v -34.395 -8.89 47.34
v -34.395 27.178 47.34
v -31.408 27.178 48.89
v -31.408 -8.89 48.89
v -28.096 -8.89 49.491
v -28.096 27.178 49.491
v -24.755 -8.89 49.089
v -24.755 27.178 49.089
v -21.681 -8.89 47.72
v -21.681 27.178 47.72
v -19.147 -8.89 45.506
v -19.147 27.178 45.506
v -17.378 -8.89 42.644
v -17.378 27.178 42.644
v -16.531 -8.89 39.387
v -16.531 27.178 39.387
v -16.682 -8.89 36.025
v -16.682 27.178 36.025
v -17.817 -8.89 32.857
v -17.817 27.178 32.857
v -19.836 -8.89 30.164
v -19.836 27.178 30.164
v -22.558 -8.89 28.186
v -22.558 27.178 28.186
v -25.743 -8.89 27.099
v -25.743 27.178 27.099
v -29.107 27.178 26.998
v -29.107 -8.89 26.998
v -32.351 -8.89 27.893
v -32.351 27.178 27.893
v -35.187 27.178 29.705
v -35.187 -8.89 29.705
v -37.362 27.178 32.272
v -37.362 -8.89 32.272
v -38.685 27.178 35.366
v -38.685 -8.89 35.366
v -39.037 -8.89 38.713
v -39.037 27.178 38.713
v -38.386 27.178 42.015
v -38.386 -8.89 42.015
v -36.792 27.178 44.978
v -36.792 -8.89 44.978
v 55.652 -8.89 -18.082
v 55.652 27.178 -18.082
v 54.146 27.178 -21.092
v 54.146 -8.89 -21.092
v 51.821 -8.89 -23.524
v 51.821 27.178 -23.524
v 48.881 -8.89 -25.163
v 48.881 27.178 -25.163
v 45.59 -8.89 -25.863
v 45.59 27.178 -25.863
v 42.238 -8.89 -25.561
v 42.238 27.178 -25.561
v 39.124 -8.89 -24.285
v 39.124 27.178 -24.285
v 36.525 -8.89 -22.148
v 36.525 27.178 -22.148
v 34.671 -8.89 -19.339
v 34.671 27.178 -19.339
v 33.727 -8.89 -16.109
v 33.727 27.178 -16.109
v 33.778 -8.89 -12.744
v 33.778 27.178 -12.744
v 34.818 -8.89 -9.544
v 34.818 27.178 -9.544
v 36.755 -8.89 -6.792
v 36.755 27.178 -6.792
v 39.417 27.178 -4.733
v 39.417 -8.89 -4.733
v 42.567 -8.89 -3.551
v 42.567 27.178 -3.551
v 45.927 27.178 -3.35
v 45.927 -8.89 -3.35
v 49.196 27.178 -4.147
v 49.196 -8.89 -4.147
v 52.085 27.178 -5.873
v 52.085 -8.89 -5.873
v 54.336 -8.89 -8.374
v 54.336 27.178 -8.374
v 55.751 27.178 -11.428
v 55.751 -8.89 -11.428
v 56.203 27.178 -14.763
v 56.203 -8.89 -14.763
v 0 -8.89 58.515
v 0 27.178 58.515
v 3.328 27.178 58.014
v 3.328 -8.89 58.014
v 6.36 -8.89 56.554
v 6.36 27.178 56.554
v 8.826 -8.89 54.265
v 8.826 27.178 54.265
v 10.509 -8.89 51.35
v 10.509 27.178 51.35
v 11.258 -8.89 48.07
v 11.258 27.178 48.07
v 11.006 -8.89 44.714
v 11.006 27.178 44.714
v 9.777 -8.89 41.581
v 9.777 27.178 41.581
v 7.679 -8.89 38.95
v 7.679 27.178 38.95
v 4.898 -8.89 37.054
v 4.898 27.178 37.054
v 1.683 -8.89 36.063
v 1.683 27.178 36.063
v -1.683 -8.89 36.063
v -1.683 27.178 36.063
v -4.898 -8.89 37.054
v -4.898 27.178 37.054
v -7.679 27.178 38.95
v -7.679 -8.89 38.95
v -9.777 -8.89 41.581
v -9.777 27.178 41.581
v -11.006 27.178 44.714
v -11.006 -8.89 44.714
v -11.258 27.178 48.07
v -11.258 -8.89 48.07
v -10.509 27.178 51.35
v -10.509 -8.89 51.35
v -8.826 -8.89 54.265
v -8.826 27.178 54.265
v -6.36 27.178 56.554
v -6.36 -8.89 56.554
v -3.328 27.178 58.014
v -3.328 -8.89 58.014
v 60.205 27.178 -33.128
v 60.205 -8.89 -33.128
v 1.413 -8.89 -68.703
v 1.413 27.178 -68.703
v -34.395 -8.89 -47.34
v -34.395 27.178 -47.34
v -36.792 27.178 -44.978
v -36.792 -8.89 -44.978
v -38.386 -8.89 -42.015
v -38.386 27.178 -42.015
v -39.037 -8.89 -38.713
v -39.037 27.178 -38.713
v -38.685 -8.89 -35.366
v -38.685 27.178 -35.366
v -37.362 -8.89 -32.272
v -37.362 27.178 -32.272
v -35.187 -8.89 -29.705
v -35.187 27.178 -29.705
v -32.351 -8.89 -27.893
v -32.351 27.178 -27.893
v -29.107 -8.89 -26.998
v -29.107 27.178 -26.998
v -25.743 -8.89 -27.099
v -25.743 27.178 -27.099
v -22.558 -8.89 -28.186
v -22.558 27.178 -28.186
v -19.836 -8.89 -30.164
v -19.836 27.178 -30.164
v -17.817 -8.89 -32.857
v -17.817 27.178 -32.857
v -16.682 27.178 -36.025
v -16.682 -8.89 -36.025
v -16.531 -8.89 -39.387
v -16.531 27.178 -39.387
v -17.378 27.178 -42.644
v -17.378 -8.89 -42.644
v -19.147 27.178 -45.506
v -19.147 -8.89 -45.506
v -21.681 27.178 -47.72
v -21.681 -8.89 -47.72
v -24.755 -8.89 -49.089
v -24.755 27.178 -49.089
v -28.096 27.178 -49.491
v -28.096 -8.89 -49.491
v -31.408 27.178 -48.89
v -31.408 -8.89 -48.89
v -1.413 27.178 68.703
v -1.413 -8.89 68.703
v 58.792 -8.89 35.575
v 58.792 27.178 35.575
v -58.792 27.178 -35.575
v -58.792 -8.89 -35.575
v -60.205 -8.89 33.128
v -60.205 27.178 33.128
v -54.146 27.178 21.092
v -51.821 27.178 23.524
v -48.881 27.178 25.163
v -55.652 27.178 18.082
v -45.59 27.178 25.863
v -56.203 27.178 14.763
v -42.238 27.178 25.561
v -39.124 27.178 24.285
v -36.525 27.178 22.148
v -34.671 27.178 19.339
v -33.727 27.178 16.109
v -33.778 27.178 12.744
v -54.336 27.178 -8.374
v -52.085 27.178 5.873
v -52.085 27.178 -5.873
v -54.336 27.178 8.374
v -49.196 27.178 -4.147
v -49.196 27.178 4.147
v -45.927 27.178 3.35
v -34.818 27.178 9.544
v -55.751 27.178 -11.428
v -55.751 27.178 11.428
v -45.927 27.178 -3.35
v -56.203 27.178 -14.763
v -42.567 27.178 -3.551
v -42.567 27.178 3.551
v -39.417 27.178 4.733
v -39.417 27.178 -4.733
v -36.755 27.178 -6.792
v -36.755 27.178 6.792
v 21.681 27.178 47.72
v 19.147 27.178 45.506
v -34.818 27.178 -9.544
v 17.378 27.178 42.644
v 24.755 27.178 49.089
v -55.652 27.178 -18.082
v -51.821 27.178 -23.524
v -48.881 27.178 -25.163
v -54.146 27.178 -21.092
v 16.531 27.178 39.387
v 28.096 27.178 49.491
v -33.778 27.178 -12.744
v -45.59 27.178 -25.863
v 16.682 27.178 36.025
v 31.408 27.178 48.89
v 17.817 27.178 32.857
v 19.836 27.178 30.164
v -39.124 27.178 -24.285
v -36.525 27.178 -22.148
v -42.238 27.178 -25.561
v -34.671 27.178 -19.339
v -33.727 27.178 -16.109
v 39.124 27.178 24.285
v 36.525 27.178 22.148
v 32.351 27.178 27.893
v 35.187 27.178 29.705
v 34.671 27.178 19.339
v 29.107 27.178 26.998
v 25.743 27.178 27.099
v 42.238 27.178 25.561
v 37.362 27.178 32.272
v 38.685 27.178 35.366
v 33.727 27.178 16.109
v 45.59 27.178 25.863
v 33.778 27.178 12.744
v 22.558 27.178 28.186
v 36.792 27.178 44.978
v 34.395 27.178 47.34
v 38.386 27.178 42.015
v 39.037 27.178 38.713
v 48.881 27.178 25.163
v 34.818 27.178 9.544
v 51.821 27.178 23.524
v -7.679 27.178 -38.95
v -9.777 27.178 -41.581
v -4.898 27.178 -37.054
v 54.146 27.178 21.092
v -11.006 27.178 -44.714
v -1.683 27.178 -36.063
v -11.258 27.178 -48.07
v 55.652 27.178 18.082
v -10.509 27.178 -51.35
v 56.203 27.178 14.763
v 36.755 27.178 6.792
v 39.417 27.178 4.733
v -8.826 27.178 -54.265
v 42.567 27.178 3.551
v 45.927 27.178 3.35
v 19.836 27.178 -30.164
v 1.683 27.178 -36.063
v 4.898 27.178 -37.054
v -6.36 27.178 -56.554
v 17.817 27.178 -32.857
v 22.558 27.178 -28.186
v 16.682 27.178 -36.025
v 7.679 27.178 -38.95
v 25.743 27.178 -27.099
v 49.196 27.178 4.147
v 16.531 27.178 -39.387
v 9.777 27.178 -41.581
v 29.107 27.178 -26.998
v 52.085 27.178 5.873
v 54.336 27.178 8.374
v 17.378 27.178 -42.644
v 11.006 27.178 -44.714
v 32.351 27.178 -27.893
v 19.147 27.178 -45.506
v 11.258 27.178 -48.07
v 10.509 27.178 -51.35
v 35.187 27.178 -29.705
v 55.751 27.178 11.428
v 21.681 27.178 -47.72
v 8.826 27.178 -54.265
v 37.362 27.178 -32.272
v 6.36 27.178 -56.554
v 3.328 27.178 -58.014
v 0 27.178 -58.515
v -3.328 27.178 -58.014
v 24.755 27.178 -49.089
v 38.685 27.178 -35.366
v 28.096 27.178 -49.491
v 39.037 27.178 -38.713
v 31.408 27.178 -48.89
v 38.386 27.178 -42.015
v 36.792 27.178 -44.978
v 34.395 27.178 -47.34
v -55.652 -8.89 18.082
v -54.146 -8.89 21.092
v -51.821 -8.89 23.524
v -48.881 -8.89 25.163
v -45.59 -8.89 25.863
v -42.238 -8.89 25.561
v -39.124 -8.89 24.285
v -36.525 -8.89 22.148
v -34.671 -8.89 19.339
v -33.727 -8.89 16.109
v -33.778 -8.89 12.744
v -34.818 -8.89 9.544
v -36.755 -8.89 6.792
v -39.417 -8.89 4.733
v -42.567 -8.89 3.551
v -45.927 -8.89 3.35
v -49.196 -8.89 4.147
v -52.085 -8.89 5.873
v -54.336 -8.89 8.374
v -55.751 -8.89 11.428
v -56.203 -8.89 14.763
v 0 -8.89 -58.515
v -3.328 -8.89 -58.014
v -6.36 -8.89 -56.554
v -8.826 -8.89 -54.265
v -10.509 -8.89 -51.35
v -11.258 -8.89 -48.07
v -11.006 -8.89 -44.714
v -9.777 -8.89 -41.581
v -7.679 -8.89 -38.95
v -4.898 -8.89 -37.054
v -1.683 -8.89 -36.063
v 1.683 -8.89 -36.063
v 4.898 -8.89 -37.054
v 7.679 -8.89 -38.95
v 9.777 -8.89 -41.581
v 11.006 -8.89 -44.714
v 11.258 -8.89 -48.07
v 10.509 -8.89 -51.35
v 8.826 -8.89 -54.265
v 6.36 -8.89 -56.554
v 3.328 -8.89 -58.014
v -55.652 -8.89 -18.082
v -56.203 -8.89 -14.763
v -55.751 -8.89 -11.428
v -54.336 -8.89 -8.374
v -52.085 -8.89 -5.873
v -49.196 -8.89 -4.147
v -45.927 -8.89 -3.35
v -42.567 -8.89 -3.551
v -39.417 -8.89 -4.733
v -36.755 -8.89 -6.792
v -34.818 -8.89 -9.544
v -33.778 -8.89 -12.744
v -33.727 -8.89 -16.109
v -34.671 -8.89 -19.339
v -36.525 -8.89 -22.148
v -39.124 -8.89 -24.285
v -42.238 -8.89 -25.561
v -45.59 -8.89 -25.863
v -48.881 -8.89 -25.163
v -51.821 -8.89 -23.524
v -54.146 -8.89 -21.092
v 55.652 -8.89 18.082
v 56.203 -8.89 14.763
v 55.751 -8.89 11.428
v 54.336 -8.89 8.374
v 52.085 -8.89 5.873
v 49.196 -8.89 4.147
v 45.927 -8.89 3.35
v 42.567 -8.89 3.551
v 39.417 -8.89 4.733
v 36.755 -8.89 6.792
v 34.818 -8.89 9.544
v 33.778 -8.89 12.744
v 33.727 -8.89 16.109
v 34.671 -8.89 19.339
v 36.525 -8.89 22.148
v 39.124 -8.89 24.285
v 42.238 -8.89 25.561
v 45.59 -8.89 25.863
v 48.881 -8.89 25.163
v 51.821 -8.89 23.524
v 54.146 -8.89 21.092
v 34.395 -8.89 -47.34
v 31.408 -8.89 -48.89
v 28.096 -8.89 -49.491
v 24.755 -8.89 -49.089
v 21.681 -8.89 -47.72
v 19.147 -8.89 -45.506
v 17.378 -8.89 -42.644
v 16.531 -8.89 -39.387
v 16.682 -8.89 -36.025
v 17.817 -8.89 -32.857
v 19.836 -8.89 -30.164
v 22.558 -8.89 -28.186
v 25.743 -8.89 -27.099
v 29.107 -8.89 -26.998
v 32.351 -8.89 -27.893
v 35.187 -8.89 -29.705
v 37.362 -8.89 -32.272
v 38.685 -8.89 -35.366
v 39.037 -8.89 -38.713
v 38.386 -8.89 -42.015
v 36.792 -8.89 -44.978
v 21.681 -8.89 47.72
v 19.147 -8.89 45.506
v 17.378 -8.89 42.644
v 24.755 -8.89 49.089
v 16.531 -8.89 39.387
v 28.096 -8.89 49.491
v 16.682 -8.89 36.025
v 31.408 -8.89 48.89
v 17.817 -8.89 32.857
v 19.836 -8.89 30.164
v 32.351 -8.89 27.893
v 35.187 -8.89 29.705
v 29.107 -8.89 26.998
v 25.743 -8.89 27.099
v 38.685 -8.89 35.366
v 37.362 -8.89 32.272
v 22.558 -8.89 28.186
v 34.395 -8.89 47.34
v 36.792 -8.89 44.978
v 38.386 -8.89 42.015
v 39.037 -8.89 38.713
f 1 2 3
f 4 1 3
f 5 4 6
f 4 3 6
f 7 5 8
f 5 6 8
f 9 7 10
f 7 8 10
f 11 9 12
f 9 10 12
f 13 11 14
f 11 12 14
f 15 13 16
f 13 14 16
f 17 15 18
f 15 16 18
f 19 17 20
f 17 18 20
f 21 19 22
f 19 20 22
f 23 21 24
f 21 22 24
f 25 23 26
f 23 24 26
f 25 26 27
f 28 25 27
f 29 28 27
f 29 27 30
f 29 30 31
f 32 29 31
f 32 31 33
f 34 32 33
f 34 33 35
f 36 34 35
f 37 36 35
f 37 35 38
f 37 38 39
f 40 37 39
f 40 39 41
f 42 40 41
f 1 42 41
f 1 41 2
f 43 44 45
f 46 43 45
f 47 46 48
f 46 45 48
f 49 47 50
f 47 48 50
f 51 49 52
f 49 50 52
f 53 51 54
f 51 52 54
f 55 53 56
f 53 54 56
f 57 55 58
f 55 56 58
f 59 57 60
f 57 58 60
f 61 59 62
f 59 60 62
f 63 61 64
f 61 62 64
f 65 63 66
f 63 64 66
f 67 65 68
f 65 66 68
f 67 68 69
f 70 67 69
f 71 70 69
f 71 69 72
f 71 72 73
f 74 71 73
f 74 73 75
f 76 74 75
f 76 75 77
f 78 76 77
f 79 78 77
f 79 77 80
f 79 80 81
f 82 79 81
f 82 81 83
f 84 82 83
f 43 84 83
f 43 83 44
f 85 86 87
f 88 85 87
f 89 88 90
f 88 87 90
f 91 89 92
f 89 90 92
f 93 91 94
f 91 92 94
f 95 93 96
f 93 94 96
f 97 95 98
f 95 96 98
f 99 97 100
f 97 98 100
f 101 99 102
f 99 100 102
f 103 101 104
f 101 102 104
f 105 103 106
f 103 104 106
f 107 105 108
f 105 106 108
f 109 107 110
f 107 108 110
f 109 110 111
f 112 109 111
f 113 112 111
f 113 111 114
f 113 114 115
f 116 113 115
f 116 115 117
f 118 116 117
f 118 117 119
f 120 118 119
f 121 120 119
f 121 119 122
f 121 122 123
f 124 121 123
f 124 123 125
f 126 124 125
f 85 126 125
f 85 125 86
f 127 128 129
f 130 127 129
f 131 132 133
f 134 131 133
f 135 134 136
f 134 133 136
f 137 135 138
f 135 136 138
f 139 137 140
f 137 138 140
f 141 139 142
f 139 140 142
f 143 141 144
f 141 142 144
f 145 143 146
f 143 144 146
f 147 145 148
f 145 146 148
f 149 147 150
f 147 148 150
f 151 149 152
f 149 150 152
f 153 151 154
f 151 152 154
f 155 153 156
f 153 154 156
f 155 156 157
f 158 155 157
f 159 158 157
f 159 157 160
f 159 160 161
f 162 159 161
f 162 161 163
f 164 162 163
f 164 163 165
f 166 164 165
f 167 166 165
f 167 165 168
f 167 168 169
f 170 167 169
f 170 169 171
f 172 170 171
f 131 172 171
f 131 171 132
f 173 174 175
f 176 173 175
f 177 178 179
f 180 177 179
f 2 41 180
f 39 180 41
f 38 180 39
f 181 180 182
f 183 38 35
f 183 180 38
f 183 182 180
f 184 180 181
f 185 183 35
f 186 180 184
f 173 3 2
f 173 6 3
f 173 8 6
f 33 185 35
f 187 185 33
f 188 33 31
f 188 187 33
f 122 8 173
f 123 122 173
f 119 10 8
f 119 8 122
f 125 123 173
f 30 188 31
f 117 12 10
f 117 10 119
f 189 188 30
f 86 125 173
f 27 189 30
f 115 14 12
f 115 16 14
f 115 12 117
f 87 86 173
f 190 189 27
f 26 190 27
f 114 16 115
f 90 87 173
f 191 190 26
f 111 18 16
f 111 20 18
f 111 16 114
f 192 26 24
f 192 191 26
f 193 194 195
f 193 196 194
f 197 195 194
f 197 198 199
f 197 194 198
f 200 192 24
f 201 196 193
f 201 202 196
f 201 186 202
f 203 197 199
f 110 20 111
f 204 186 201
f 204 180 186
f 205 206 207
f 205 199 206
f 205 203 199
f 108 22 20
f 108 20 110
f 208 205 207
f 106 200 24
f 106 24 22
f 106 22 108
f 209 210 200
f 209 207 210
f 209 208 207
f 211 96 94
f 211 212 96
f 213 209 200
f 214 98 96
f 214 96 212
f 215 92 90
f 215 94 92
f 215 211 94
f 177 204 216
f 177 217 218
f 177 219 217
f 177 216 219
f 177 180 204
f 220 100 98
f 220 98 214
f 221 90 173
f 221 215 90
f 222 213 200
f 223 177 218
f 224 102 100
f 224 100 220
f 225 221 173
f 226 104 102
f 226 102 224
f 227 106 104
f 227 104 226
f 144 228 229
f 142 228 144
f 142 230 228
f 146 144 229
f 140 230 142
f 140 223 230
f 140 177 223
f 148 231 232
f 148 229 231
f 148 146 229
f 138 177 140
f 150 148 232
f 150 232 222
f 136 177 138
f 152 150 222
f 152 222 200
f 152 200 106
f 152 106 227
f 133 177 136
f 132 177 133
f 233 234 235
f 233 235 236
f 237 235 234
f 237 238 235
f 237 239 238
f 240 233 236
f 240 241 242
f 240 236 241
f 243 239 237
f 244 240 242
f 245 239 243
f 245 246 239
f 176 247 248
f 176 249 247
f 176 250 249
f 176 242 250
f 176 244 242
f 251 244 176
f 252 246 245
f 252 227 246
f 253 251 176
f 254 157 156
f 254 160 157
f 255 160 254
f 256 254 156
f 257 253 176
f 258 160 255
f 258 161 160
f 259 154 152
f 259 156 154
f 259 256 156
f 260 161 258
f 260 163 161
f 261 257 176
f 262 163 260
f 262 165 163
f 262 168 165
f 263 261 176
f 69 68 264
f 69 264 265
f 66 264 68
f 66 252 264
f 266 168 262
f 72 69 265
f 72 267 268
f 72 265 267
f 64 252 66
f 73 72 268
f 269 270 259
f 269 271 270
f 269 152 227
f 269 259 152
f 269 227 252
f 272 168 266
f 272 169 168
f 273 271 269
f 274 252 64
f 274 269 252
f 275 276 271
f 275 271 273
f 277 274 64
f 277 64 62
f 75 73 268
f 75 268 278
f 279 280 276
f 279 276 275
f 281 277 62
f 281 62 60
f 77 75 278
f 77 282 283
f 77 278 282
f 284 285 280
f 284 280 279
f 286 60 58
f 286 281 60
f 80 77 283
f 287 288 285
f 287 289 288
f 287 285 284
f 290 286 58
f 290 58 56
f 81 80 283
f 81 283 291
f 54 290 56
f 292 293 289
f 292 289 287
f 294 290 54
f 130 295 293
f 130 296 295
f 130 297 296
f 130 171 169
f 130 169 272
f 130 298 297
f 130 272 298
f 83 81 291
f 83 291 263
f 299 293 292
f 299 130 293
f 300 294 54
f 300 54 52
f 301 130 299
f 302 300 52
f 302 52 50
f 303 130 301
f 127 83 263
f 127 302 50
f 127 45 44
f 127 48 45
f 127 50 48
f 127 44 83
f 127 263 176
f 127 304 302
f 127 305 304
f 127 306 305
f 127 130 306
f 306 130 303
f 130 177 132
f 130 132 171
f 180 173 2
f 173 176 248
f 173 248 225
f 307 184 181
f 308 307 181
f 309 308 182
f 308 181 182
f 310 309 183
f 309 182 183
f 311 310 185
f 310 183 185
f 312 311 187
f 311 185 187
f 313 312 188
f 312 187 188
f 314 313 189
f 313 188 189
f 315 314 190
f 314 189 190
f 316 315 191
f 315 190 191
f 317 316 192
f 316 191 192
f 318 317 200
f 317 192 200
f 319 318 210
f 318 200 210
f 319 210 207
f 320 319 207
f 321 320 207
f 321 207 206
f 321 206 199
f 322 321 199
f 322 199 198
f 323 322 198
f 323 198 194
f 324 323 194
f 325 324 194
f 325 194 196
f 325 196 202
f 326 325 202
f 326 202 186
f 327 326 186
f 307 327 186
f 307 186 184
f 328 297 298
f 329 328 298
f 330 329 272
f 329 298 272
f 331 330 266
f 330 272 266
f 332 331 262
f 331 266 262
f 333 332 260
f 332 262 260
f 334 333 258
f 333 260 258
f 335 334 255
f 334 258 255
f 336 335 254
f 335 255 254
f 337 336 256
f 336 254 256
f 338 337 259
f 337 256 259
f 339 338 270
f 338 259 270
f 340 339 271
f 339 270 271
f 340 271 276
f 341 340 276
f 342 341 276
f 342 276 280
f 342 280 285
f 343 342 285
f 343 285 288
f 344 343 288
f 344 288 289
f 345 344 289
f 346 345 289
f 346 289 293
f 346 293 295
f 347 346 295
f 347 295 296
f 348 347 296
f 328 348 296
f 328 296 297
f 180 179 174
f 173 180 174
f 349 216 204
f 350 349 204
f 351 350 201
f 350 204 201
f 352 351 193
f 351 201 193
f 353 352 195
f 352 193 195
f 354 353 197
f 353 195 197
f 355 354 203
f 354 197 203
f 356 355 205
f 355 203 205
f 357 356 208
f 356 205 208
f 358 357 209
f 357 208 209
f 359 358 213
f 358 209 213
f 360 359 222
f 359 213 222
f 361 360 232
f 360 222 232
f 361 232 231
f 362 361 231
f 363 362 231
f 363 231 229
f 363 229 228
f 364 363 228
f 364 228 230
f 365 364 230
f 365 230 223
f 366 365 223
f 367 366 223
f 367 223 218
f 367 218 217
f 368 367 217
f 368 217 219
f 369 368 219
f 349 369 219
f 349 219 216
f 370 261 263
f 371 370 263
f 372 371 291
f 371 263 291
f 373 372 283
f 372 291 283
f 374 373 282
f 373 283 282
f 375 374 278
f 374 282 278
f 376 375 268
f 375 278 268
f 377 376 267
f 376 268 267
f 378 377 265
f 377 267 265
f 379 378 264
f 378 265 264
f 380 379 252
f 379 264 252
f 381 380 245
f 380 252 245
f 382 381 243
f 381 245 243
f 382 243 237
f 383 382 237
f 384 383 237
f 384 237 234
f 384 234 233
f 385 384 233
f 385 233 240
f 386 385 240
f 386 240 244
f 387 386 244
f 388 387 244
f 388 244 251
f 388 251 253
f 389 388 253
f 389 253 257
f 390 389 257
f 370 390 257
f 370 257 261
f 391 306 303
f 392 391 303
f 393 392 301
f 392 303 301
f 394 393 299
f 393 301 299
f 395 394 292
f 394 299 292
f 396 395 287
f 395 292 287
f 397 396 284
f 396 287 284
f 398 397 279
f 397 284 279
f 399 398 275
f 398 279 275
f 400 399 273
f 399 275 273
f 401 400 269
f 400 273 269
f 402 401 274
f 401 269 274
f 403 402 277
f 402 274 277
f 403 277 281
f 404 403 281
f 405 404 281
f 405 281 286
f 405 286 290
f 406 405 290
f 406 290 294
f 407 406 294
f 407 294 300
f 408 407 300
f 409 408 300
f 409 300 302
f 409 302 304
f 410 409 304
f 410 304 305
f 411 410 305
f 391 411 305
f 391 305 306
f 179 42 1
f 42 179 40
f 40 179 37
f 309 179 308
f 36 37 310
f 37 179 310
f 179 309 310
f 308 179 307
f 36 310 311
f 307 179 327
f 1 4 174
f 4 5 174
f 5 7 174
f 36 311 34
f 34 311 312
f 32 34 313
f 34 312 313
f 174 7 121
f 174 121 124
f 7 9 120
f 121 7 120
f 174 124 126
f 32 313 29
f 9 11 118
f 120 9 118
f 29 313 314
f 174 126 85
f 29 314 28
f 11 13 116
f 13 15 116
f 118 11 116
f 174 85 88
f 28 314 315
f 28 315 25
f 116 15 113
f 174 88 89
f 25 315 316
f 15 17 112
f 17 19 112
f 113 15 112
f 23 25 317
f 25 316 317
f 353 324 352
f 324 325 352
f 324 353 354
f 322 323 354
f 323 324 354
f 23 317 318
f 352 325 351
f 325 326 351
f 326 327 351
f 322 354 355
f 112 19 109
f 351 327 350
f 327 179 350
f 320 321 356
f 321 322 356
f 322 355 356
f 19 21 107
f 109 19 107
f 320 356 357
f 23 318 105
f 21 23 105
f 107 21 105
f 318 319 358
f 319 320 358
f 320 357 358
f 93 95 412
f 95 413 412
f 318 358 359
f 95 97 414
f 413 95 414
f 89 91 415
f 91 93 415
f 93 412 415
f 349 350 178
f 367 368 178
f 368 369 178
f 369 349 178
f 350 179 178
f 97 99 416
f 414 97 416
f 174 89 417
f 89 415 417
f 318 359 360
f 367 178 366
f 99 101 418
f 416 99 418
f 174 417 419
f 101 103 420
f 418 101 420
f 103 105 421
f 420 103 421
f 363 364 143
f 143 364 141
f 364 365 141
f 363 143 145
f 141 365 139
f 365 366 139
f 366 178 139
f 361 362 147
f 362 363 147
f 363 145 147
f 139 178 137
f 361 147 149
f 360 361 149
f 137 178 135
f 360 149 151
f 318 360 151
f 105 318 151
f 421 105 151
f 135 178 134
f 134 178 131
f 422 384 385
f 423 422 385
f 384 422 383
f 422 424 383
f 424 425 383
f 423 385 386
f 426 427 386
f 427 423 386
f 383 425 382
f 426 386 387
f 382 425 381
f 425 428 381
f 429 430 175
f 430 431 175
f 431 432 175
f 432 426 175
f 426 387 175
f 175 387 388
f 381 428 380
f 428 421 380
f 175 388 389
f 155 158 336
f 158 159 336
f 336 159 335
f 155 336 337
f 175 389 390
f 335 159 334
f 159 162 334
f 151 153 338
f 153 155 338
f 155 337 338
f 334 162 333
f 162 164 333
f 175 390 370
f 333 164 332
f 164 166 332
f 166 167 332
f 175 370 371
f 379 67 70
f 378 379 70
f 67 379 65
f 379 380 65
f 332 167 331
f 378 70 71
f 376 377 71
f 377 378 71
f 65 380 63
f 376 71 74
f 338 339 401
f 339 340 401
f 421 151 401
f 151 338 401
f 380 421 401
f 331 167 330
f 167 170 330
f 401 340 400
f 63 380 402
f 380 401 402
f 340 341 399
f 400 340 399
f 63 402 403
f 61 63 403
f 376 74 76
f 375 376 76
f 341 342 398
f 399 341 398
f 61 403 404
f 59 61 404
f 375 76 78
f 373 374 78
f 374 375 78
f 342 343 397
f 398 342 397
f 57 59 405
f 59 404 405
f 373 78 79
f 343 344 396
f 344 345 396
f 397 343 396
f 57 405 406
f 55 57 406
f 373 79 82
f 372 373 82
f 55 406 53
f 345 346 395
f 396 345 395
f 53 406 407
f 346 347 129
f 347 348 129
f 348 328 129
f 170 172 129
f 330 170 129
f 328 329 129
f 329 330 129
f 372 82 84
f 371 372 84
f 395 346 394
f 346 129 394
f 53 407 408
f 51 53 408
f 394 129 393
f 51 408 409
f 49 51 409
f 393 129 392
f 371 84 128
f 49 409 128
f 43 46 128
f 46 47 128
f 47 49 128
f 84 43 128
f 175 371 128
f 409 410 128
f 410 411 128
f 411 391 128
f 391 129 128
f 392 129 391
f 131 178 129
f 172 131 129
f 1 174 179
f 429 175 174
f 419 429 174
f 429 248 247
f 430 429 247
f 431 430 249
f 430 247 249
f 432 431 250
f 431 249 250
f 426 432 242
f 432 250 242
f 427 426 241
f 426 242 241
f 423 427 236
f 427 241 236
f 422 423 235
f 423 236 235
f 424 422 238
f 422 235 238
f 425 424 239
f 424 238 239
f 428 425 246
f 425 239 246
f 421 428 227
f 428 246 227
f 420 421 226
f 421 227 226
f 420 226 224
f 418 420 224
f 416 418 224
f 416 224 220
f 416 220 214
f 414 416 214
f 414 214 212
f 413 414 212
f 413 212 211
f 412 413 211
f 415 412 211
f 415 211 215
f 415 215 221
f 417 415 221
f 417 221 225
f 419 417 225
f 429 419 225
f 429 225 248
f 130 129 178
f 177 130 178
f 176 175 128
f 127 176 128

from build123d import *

# Parameters (mm, degrees)
BOSS_EXTRUDE1_DEPTH      = 27.178
BOSS_EXTRUDE1_DEPTH_BACK = 8.89
CUT_EXTRUDE1_REACH       = 100.213
SKETCH3_R                = 11.289480869
CIRPATTERN1_COUNT        = 10


with BuildPart() as part:
    # Sketch1 → Boss-Extrude1 (new, two sides: drawn at the far end of the back side and taken through both)
    with BuildSketch(Plane(origin=(0, 0, 0), x_dir=(1, 0, 0), z_dir=(0, 1, 0)).offset(-BOSS_EXTRUDE1_DEPTH_BACK)):
        Polygon((58.792489402, -35.575073205), (60.205161838, 33.128252771), (1.412672436, 68.703325976), (-58.792489402, 35.575073205), (-60.205161838, -33.128252771), (-1.412672436, -68.703325976), align=None)
    extrude(amount=BOSS_EXTRUDE1_DEPTH + BOSS_EXTRUDE1_DEPTH_BACK)

    # Sketch3 → Cut-Extrude1 (cut, up to next)
    with BuildSketch(Plane(origin=(0, 27.178, 0), x_dir=(1, 0, 0), z_dir=(0, 1, 0)), mode=Mode.PRIVATE) as cut_extrude1_sk1:
        with Locations((0, -47.225969932)):
            Circle(SKETCH3_R)
    cut_extrude1_tool1 = extrude(cut_extrude1_sk1.sketch, amount=-CUT_EXTRUDE1_REACH, mode=Mode.PRIVATE) & part.part
    cut_extrude1 = cut_extrude1_tool1.solids().sort_by_distance((0, 27.178, 47.22597))[0]
    add(cut_extrude1, mode=Mode.SUBTRACT)

    # CirPattern1: Cut-Extrude1 ×10 about axis
    cirpattern1_axis = Axis((0, 28.9814, 0), (0, -1, 0))
    for i in range(1, CIRPATTERN1_COUNT):
        add(cut_extrude1.rotate(cirpattern1_axis, i * 360 / CIRPATTERN1_COUNT), mode=Mode.SUBTRACT)


solid = part.part
